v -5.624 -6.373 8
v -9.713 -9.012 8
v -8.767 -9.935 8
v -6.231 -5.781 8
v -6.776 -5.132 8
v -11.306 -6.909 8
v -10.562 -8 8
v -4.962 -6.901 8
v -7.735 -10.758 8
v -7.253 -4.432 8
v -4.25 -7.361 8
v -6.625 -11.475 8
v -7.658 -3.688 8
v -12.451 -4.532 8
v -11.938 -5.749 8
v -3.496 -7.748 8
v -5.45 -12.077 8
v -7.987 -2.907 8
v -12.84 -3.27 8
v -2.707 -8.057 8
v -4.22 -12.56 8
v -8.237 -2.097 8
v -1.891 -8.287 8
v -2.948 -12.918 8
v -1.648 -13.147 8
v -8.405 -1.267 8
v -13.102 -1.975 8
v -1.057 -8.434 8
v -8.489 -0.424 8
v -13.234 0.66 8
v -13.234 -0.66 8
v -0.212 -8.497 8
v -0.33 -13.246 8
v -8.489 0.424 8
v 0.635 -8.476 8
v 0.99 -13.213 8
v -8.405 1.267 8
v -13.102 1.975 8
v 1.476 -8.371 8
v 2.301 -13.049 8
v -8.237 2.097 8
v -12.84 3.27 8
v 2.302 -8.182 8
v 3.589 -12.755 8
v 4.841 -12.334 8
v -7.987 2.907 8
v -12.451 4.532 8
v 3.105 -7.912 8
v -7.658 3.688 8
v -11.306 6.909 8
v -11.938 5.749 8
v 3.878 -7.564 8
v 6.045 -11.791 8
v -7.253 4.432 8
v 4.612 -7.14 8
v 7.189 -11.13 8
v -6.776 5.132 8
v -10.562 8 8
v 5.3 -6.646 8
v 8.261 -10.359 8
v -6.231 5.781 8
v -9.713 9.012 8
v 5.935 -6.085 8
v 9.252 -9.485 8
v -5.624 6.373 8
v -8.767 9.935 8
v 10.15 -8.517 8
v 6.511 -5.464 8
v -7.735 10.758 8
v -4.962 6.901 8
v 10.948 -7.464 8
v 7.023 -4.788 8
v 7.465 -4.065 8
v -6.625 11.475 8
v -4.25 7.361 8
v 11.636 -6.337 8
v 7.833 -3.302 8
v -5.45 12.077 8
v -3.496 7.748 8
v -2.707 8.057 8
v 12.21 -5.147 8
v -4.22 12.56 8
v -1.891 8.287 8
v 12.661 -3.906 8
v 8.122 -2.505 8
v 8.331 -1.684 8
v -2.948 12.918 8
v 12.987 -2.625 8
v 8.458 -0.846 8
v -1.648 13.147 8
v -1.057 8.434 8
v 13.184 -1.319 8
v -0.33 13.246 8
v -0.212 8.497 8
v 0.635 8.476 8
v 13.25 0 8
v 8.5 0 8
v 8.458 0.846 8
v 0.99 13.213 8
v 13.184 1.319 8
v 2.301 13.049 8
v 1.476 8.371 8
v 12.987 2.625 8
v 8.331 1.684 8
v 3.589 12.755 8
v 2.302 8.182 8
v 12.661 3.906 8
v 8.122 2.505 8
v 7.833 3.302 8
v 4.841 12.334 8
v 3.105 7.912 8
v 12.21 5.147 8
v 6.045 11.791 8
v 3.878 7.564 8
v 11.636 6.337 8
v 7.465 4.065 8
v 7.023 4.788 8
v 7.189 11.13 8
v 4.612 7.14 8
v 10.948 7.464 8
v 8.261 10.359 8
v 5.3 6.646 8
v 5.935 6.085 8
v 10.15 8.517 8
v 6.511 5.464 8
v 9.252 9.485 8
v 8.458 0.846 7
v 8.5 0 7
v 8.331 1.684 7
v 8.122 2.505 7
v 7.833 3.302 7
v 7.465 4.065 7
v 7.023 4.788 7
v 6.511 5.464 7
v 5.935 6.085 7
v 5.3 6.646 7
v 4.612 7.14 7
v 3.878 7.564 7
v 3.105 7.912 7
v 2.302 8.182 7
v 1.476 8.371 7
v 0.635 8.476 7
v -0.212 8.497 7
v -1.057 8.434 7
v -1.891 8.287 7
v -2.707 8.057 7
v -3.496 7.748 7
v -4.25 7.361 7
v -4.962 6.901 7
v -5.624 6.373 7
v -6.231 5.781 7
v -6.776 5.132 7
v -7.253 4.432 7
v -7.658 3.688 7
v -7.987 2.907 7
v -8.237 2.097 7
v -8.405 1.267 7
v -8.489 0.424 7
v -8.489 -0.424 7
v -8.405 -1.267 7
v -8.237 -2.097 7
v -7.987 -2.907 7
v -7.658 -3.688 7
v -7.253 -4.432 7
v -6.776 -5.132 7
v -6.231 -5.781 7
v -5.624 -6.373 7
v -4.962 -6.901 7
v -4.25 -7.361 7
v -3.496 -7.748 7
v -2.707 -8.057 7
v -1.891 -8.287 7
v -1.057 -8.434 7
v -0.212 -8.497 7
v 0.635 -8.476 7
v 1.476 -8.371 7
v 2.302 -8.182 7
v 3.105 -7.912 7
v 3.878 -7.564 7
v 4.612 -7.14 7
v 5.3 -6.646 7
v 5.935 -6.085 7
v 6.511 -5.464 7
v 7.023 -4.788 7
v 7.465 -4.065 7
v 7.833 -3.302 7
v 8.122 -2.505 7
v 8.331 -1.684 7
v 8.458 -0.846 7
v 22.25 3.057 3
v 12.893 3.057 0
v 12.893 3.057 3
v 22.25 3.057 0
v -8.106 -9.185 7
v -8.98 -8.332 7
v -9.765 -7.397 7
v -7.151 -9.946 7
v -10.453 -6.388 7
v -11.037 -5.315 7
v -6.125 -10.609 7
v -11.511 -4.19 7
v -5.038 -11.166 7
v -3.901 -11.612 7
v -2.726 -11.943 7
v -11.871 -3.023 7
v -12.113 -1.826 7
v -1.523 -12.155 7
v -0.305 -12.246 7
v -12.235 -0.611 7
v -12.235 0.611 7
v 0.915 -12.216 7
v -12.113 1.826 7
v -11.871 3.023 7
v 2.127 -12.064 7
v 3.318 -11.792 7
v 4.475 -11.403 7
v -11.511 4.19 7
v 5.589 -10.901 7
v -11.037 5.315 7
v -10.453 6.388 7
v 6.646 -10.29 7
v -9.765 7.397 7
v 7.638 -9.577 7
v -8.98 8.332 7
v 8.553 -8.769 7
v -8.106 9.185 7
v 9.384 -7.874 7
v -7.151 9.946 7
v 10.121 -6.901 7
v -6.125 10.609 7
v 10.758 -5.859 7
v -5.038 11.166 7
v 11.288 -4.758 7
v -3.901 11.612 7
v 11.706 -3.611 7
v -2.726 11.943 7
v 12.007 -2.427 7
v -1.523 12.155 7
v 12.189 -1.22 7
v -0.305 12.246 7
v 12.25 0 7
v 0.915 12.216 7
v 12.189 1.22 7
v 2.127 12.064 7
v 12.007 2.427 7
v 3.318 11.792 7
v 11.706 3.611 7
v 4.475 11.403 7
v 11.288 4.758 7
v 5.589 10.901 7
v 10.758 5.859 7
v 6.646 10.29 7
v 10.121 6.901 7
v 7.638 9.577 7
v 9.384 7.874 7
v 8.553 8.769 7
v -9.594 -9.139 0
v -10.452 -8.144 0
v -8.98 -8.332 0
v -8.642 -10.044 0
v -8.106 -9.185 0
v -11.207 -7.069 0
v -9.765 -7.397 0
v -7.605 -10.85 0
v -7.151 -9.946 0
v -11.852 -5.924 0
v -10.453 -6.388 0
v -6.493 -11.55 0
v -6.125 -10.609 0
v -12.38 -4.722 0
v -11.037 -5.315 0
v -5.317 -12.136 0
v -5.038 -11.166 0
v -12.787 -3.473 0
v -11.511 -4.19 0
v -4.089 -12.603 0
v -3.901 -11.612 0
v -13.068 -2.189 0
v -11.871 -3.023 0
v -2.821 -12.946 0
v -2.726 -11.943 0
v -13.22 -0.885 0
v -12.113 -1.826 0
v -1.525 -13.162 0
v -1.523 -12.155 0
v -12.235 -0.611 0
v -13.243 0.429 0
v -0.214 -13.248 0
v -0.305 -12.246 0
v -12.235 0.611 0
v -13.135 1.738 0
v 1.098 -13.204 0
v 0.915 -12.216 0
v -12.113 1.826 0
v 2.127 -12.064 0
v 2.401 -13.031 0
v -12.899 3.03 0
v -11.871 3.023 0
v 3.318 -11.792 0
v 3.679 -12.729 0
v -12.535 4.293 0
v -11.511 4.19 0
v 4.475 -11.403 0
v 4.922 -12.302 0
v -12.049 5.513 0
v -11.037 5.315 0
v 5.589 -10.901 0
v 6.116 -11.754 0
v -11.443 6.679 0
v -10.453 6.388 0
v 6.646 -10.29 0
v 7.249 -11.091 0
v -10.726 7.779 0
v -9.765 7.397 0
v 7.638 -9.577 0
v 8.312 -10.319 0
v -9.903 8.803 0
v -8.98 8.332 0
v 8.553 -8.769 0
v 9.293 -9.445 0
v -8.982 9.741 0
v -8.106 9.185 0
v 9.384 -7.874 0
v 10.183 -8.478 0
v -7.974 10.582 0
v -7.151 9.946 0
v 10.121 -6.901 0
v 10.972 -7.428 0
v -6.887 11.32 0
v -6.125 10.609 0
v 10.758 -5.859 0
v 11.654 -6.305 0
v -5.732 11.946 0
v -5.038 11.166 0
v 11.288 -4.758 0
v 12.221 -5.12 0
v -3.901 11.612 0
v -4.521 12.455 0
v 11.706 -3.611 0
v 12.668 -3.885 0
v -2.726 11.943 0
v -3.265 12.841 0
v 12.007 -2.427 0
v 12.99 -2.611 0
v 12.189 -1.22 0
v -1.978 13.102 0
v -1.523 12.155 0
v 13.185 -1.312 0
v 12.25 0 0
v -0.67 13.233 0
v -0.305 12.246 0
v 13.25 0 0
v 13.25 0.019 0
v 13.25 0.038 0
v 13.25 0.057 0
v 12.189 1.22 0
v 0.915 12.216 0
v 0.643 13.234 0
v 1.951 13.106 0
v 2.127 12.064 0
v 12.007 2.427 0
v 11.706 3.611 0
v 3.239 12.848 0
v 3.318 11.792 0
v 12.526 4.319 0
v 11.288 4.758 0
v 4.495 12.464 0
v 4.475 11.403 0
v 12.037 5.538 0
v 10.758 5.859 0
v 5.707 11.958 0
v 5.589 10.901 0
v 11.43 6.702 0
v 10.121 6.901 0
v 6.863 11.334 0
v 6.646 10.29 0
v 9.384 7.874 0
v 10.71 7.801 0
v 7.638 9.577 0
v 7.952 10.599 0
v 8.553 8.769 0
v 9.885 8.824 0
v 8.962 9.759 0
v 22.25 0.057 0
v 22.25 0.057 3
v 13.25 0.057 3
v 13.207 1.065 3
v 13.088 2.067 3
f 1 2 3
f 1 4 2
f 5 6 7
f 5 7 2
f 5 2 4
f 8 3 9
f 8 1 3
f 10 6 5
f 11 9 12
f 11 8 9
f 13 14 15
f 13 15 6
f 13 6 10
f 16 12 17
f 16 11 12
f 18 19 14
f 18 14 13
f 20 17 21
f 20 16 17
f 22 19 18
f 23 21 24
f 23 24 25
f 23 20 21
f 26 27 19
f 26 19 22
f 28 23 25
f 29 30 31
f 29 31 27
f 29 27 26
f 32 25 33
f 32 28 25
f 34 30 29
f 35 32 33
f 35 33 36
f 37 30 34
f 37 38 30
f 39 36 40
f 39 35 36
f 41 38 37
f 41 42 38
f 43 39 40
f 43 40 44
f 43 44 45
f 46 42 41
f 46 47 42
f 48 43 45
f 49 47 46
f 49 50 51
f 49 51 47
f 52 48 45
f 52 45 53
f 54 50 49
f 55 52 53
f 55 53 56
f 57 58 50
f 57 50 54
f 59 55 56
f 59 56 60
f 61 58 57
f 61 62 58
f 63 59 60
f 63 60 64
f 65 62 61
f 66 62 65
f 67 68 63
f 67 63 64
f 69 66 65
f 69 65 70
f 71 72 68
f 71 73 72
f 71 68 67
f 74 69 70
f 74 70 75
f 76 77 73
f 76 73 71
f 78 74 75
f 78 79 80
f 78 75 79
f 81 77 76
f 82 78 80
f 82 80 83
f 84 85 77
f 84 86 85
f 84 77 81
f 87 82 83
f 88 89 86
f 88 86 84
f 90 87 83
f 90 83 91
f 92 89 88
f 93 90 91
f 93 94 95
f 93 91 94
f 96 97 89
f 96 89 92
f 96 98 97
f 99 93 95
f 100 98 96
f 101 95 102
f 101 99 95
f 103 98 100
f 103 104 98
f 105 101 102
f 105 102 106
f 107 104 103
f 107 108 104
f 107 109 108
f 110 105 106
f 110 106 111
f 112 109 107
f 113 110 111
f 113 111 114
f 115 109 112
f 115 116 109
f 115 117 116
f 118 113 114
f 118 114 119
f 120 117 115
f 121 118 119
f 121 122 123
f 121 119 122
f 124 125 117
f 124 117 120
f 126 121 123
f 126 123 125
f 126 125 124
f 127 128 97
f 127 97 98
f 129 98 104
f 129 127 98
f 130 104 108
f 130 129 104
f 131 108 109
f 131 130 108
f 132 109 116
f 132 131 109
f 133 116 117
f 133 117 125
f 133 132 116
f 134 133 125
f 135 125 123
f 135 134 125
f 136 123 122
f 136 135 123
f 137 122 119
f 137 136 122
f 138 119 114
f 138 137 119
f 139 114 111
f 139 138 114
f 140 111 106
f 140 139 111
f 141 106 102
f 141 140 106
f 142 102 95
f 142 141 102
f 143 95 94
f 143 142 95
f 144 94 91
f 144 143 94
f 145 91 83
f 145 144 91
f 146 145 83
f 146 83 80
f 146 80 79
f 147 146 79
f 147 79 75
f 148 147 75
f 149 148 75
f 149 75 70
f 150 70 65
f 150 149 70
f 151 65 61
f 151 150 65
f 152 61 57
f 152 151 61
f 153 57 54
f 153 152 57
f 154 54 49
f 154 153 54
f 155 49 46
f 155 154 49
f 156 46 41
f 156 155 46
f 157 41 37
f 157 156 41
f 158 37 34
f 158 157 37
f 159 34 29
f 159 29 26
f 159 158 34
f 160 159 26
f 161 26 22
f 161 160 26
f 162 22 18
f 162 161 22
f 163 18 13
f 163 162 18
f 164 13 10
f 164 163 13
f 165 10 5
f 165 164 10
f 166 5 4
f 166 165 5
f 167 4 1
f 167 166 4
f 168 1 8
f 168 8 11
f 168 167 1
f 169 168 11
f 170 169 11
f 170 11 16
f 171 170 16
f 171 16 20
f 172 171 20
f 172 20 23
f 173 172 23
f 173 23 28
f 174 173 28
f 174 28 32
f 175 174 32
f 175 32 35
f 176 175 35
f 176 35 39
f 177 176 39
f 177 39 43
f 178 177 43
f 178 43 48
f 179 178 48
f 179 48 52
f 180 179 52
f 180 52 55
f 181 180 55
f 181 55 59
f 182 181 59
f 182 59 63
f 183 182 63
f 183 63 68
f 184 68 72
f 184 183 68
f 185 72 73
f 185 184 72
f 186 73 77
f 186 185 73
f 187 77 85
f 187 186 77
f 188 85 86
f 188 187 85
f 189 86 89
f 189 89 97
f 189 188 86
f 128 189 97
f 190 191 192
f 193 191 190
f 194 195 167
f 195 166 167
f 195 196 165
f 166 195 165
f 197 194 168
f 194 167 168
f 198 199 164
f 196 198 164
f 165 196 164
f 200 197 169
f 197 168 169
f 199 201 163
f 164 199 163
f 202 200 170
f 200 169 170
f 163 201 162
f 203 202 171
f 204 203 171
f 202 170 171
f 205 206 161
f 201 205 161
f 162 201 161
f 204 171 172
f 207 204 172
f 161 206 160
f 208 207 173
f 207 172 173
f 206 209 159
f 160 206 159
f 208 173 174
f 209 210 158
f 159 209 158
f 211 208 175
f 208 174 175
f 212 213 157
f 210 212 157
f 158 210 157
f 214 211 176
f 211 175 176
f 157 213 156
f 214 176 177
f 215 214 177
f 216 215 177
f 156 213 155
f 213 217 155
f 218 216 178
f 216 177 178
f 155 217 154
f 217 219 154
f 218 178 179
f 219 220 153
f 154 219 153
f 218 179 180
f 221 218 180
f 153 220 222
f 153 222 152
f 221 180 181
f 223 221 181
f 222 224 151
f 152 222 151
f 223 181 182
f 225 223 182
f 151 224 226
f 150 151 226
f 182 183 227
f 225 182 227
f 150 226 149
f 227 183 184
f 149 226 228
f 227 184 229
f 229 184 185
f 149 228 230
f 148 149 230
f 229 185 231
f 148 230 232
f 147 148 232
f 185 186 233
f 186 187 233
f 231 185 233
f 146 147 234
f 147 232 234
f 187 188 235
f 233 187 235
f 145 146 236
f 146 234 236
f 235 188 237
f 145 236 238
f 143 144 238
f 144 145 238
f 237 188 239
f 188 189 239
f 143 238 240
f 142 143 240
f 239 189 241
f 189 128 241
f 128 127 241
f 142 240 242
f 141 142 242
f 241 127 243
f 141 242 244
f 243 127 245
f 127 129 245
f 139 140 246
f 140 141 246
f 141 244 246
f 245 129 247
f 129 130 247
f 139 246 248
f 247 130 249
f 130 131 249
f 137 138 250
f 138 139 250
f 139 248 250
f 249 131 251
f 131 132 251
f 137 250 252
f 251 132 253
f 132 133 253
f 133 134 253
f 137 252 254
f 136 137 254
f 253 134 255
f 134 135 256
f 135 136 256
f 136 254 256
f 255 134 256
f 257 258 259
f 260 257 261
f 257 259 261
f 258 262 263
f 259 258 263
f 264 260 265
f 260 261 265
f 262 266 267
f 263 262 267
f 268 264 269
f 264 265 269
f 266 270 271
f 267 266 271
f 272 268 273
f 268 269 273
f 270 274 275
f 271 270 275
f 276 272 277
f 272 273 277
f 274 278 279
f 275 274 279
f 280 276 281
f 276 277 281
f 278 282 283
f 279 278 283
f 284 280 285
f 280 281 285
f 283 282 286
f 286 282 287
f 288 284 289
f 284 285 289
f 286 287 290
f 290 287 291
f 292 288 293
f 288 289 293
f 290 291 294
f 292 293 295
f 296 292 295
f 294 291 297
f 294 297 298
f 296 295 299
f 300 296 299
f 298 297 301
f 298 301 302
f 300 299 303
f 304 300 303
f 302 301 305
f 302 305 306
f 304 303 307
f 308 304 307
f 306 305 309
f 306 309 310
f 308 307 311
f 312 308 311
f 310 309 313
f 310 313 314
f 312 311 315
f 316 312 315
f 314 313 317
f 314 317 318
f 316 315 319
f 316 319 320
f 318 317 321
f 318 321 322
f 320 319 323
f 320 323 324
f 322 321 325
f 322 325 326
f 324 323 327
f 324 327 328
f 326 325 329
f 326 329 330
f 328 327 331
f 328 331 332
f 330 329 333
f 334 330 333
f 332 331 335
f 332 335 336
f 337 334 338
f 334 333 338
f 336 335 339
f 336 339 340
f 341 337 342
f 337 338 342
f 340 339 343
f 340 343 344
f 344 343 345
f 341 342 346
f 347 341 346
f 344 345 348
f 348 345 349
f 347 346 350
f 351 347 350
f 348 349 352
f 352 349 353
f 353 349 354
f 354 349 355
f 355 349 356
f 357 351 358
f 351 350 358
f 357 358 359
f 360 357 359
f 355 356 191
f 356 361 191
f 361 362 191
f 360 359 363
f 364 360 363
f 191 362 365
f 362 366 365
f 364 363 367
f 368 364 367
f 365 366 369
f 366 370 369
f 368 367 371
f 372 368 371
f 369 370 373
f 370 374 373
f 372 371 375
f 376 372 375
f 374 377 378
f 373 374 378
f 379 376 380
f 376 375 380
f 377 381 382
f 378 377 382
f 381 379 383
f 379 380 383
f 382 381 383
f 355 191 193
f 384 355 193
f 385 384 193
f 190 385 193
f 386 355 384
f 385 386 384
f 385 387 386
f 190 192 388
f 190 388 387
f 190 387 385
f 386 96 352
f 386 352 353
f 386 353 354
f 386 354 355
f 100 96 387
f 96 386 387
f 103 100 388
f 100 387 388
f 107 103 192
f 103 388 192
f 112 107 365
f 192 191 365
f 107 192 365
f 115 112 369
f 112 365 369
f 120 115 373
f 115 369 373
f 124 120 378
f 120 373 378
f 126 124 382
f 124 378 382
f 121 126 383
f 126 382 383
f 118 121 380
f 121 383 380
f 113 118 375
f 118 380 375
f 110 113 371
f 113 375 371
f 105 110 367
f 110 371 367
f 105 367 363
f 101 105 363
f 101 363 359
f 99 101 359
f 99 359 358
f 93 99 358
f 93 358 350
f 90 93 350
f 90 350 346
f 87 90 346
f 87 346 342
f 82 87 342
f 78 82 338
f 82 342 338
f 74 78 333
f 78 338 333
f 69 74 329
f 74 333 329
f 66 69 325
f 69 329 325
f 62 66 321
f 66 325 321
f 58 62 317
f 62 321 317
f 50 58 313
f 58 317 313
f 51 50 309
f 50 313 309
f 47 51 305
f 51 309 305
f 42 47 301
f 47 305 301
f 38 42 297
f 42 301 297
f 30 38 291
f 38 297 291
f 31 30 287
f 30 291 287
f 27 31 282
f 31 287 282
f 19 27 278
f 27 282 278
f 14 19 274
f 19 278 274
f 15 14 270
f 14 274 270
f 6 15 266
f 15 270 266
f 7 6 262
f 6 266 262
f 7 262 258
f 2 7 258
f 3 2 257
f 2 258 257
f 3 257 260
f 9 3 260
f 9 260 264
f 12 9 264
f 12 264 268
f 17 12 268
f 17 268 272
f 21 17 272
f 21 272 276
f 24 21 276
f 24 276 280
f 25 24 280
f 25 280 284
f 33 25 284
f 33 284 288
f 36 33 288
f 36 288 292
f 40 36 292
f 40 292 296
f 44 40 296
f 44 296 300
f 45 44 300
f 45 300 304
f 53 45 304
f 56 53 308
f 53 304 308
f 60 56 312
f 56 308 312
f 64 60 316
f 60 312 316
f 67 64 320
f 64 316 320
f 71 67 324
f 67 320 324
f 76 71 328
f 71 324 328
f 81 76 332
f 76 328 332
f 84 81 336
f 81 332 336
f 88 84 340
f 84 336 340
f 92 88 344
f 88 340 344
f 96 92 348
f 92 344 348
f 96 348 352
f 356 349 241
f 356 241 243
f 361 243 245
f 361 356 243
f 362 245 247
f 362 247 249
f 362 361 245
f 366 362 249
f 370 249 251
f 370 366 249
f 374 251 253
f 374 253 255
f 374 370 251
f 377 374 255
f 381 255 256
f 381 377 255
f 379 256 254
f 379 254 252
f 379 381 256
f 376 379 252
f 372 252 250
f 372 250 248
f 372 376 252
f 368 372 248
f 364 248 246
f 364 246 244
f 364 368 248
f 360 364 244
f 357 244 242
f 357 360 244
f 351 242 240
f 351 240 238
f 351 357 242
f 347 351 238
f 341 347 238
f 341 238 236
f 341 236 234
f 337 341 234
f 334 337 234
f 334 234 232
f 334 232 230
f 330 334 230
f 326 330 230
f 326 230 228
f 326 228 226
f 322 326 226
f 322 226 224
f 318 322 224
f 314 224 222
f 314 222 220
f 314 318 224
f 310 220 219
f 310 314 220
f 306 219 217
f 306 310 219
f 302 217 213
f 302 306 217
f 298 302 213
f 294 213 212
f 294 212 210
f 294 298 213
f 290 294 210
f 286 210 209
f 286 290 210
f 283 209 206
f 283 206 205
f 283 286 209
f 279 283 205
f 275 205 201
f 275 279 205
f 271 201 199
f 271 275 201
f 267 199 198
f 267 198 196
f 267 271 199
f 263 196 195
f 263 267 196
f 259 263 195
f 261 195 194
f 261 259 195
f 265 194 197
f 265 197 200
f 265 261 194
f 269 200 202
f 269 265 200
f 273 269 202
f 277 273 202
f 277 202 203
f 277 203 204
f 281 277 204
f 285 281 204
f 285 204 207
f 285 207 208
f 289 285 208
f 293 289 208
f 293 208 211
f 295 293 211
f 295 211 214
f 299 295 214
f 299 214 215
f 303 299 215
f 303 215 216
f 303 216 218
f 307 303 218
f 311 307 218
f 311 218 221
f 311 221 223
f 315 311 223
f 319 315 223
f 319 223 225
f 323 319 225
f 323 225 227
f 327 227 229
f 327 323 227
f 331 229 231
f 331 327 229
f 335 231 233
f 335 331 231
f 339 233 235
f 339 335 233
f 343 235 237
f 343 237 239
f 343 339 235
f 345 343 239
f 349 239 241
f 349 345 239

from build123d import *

# Parameters (mm, degrees)
SKETCH_1_R      = 13.25
SKETCH_1_R_2    = 12.25
EXTRUDE_1_DEPTH = 7
SKETCH_2_R      = 13.25
SKETCH_2_R_2    = 8.5
EXTRUDE_2_DEPTH = 1
SKETCH_3_W      = 10
SKETCH_3_H      = 3
EXTRUDE_3_DEPTH = 3


with BuildPart() as part:
    # ｽｹｯﾁ1 → ﾎﾞｽ - 押し出し1 (new body)
    with BuildSketch(Plane.XY):
        Circle(SKETCH_1_R)
        Circle(SKETCH_1_R_2, mode=Mode.SUBTRACT)
    extrude(amount=EXTRUDE_1_DEPTH)

    # ｽｹｯﾁ2 → ﾎﾞｽ - 押し出し2 (add)
    with BuildSketch(Plane.XY.offset(7)):
        Circle(SKETCH_2_R)
        Circle(SKETCH_2_R_2, mode=Mode.SUBTRACT)
    extrude(amount=EXTRUDE_2_DEPTH)

    # ｽｹｯﾁ3 → ﾎﾞｽ - 押し出し3 (add)
    with BuildSketch(Plane.XY):
        with Locations((17.25, 1.556870996)):
            Rectangle(SKETCH_3_W, SKETCH_3_H)
    extrude(amount=EXTRUDE_3_DEPTH)


solid = part.part
